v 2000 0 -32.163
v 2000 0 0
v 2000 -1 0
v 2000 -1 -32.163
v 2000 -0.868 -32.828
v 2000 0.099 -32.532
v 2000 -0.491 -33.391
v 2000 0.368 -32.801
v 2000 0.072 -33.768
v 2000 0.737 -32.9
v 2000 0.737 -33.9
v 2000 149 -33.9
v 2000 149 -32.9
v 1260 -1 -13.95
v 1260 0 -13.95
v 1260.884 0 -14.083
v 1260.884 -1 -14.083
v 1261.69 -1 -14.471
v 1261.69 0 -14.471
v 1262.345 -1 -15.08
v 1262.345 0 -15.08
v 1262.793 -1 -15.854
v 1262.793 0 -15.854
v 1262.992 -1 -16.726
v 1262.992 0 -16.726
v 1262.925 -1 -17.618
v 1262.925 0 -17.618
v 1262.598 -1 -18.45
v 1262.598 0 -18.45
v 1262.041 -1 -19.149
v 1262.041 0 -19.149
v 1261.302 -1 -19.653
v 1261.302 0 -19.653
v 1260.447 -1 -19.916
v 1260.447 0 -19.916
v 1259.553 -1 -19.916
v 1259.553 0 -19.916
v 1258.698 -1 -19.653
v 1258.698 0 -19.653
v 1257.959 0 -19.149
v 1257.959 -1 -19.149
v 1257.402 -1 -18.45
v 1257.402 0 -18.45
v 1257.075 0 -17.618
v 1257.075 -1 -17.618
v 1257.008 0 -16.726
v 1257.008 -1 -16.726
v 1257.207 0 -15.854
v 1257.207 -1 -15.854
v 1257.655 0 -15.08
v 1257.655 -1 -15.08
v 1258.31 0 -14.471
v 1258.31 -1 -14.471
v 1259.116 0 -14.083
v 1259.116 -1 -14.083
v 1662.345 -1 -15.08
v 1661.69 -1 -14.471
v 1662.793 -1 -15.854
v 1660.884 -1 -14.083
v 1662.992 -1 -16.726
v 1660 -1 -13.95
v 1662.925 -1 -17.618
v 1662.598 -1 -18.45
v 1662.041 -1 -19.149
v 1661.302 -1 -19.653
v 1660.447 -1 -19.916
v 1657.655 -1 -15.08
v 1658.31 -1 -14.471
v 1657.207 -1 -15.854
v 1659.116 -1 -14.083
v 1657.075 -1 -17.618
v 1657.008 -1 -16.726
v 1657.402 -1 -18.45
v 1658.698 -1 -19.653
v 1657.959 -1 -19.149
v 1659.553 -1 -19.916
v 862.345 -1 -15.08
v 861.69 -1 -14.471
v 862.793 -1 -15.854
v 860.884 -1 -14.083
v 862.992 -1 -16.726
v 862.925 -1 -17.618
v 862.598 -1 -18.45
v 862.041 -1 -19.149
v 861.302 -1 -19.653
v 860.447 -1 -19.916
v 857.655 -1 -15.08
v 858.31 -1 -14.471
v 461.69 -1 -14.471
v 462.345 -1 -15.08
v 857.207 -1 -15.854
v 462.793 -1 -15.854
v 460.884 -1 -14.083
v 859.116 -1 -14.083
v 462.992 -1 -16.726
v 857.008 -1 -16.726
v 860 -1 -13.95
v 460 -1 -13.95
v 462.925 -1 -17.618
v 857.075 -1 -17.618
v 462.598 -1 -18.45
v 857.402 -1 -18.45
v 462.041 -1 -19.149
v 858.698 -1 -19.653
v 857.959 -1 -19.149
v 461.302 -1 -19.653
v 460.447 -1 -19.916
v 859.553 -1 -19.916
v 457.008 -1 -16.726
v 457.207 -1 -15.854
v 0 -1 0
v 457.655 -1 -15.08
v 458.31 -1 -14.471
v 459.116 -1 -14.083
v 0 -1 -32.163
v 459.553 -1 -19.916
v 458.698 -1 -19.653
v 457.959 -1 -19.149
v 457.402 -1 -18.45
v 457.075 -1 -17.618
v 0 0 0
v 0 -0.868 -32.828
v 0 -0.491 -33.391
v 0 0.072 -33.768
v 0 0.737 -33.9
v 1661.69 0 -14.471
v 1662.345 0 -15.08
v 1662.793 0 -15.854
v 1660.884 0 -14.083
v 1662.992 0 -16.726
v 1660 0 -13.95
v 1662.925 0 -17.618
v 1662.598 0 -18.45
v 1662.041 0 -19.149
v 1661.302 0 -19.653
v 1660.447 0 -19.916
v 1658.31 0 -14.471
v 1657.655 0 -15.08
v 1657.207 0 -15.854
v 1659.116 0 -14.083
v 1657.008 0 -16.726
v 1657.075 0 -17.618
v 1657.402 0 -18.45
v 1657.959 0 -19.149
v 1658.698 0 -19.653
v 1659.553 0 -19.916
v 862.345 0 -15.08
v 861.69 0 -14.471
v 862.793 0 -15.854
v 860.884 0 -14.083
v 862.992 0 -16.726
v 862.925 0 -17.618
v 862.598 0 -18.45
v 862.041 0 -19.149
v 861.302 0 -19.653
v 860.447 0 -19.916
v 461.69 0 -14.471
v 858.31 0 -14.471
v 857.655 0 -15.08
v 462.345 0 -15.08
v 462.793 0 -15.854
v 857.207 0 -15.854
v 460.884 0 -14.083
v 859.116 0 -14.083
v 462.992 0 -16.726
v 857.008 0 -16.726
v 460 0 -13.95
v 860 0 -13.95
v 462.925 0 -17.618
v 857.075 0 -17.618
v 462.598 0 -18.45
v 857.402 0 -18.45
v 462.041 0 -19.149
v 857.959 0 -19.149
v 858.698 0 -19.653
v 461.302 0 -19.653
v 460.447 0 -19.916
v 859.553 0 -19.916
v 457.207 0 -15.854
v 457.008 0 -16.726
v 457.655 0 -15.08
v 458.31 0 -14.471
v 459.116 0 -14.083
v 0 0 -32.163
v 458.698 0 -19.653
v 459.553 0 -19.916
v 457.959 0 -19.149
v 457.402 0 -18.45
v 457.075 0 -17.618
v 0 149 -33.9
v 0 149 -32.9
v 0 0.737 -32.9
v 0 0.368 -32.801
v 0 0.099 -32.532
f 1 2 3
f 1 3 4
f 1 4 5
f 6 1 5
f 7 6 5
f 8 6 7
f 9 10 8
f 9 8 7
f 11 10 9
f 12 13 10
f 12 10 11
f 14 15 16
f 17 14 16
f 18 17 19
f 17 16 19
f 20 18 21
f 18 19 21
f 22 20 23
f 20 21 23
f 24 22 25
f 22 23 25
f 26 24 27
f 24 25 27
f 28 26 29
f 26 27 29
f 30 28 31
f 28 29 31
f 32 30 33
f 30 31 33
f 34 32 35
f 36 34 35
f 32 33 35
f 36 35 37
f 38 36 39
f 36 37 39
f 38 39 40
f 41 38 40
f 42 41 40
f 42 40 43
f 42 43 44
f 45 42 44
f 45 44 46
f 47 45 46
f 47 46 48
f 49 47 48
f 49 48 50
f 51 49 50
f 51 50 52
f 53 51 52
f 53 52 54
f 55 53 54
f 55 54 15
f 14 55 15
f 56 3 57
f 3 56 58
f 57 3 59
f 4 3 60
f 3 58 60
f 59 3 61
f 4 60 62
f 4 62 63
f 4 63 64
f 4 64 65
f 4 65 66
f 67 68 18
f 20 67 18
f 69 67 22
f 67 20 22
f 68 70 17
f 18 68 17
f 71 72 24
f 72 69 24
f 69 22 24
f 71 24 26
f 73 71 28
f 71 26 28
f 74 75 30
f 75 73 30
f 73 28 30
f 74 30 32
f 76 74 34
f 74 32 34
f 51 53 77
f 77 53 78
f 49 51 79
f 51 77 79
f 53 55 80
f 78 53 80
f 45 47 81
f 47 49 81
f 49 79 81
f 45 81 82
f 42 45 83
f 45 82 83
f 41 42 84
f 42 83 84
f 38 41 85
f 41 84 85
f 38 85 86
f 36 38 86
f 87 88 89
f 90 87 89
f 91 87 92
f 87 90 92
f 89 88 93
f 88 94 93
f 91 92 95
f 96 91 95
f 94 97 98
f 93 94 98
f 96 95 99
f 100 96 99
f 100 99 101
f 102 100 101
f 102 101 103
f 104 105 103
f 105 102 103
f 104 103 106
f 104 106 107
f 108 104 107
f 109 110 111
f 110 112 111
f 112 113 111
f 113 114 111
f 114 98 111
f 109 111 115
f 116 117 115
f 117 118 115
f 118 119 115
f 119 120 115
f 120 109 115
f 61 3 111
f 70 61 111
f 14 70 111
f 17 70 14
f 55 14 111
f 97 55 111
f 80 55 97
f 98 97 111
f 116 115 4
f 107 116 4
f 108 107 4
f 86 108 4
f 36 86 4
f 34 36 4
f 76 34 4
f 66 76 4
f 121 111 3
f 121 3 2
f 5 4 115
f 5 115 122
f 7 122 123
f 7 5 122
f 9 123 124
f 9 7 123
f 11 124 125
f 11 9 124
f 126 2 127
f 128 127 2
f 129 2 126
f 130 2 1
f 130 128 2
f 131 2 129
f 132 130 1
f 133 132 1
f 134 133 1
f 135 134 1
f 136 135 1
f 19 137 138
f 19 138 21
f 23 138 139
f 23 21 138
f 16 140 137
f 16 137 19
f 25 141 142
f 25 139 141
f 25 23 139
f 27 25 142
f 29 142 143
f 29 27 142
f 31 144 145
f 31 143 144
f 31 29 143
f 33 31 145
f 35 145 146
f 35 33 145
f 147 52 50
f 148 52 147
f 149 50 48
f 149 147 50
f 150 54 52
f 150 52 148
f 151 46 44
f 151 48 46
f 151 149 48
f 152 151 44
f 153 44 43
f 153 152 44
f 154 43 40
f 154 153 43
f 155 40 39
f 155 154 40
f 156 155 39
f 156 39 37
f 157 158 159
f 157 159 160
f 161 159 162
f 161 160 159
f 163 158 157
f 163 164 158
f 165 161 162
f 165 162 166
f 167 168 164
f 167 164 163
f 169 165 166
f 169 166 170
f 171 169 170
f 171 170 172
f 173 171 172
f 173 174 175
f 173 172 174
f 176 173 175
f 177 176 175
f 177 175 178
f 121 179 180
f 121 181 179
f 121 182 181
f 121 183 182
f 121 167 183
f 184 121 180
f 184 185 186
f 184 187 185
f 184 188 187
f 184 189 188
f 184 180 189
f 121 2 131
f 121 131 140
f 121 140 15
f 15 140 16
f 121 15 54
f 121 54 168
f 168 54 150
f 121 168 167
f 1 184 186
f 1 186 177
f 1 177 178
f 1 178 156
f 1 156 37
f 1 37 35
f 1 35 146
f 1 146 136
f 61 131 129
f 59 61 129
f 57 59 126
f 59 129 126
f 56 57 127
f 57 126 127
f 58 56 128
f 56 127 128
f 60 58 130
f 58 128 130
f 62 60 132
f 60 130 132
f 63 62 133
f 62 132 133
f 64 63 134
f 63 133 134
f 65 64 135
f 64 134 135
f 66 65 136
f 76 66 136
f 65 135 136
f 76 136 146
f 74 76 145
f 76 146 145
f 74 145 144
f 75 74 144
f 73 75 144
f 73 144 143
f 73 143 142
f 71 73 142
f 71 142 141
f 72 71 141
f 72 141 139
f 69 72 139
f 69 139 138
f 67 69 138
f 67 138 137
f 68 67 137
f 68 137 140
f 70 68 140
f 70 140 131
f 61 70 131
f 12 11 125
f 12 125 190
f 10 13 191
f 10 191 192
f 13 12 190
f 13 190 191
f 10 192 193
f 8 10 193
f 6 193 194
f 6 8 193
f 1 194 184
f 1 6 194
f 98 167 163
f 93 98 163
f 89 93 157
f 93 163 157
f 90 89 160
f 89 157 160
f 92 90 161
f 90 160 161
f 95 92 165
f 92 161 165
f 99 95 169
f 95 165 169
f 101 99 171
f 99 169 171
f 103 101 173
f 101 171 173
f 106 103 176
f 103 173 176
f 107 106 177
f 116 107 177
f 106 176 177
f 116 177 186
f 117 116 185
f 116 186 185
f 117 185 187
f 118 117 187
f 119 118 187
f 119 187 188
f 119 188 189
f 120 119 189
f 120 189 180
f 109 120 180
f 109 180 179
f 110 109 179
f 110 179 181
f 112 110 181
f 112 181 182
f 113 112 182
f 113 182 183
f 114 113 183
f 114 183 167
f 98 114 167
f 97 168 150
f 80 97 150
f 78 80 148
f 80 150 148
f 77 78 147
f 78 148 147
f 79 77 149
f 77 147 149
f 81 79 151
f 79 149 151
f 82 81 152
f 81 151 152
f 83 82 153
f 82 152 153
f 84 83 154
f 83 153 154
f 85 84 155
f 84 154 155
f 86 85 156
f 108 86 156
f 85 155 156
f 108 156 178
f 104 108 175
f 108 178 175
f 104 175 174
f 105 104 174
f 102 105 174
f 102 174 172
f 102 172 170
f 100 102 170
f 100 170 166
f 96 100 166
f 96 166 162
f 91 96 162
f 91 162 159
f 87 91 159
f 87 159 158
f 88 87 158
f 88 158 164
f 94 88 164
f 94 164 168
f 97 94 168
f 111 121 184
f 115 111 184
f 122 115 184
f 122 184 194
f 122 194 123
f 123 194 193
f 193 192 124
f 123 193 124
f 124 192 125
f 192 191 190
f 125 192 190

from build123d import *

# Parameters (mm, degrees)
SKETCH2_W                    = 33.9
SKETCH2_H                    = 1
BASE_FLANGE1_DEPTH           = 2000
EDGE_FLANGE2_STRIP_W         = 5.4732
EDGE_FLANGE2_STRIP_H         = 1
EDGE_FLANGE2_STRIP_CUT_DEPTH = 2000
EDGE_FLANGE2_DEPTH           = 2000
SKETCH10_R                   = 3
CUT_EXTRUDE1_DEPTH           = 10
SKETCH10_3_R                 = 3
CUT_EXTRUDE2_DEPTH           = 10


# Sheet-metal steps are written as plain solids
with BuildPart() as part:
    # Sketch2 → Base-Flange1 (new body)
    with BuildSketch(Plane(origin=(0, 0, 0), x_dir=(0, 0, -1), z_dir=(1, 0, 0))):
        with Locations((16.95, -0.5)):
            Rectangle(SKETCH2_W, SKETCH2_H)
    extrude(amount=BASE_FLANGE1_DEPTH)

    # Edge-Flange2 strip (across the edge) → Edge-Flange2 strip cut (cut)
    with BuildSketch(Plane(origin=(2000, 0, -33.9), x_dir=(0, 0, 1), z_dir=(-1, 0, 0))):
        with Locations((-1, -0.5)):
            Rectangle(EDGE_FLANGE2_STRIP_W, EDGE_FLANGE2_STRIP_H)
    extrude(amount=EDGE_FLANGE2_STRIP_CUT_DEPTH, mode=Mode.SUBTRACT)

    # Edge-Flange2 section (across the edge) → Edge-Flange2 (add)
    with BuildSketch(Plane(origin=(2000, 0, -33.9), x_dir=(0, 0, 1), z_dir=(-1, 0, 0))):
        with BuildLine():
            Line((0, 0.7366), (0, 149))
            Line((0, 149), (1, 149))
            Line((1, 149), (1, 0.7366))
            ThreePointArc((1, 0.7366), (1.215745145, 0.215745145), (1.7366, 0))
            Line((1.7366, 0), (1.7366, -1))
            ThreePointArc((1.7366, -1), (0.508638364, -0.491361636), (0, 0.7366))
        make_face()
    extrude(amount=EDGE_FLANGE2_DEPTH)

    # Sketch10 → Cut-Extrude1 (cut)
    with BuildSketch(Plane(origin=(0, 0, 0), x_dir=(1, 0, 0), z_dir=(0, 1, 0))):
        with Locations(Location((860, 16.95, 0), (0, 0, 270))):
            Circle(SKETCH10_R)
    extrude(amount=-CUT_EXTRUDE1_DEPTH, mode=Mode.SUBTRACT)

    # Sketch10<3> → Cut-Extrude2 (cut)
    with BuildSketch(Plane(origin=(0, 0, 0), x_dir=(1, 0, 0), z_dir=(0, 1, 0))):
        with Locations(Location((460, 16.95, 0), (0, 0, 270))):
            Circle(SKETCH10_3_R)
        with Locations(Location((860, 16.95, 0), (0, 0, 270))):
            Circle(SKETCH10_3_R)
        with Locations(Location((1260, 16.95, 0), (0, 0, 270))):
            Circle(SKETCH10_3_R)
        with Locations(Location((1660, 16.95, 0), (0, 0, 270))):
            Circle(SKETCH10_3_R)
    extrude(amount=-CUT_EXTRUDE2_DEPTH, mode=Mode.SUBTRACT)


solid = part.part
